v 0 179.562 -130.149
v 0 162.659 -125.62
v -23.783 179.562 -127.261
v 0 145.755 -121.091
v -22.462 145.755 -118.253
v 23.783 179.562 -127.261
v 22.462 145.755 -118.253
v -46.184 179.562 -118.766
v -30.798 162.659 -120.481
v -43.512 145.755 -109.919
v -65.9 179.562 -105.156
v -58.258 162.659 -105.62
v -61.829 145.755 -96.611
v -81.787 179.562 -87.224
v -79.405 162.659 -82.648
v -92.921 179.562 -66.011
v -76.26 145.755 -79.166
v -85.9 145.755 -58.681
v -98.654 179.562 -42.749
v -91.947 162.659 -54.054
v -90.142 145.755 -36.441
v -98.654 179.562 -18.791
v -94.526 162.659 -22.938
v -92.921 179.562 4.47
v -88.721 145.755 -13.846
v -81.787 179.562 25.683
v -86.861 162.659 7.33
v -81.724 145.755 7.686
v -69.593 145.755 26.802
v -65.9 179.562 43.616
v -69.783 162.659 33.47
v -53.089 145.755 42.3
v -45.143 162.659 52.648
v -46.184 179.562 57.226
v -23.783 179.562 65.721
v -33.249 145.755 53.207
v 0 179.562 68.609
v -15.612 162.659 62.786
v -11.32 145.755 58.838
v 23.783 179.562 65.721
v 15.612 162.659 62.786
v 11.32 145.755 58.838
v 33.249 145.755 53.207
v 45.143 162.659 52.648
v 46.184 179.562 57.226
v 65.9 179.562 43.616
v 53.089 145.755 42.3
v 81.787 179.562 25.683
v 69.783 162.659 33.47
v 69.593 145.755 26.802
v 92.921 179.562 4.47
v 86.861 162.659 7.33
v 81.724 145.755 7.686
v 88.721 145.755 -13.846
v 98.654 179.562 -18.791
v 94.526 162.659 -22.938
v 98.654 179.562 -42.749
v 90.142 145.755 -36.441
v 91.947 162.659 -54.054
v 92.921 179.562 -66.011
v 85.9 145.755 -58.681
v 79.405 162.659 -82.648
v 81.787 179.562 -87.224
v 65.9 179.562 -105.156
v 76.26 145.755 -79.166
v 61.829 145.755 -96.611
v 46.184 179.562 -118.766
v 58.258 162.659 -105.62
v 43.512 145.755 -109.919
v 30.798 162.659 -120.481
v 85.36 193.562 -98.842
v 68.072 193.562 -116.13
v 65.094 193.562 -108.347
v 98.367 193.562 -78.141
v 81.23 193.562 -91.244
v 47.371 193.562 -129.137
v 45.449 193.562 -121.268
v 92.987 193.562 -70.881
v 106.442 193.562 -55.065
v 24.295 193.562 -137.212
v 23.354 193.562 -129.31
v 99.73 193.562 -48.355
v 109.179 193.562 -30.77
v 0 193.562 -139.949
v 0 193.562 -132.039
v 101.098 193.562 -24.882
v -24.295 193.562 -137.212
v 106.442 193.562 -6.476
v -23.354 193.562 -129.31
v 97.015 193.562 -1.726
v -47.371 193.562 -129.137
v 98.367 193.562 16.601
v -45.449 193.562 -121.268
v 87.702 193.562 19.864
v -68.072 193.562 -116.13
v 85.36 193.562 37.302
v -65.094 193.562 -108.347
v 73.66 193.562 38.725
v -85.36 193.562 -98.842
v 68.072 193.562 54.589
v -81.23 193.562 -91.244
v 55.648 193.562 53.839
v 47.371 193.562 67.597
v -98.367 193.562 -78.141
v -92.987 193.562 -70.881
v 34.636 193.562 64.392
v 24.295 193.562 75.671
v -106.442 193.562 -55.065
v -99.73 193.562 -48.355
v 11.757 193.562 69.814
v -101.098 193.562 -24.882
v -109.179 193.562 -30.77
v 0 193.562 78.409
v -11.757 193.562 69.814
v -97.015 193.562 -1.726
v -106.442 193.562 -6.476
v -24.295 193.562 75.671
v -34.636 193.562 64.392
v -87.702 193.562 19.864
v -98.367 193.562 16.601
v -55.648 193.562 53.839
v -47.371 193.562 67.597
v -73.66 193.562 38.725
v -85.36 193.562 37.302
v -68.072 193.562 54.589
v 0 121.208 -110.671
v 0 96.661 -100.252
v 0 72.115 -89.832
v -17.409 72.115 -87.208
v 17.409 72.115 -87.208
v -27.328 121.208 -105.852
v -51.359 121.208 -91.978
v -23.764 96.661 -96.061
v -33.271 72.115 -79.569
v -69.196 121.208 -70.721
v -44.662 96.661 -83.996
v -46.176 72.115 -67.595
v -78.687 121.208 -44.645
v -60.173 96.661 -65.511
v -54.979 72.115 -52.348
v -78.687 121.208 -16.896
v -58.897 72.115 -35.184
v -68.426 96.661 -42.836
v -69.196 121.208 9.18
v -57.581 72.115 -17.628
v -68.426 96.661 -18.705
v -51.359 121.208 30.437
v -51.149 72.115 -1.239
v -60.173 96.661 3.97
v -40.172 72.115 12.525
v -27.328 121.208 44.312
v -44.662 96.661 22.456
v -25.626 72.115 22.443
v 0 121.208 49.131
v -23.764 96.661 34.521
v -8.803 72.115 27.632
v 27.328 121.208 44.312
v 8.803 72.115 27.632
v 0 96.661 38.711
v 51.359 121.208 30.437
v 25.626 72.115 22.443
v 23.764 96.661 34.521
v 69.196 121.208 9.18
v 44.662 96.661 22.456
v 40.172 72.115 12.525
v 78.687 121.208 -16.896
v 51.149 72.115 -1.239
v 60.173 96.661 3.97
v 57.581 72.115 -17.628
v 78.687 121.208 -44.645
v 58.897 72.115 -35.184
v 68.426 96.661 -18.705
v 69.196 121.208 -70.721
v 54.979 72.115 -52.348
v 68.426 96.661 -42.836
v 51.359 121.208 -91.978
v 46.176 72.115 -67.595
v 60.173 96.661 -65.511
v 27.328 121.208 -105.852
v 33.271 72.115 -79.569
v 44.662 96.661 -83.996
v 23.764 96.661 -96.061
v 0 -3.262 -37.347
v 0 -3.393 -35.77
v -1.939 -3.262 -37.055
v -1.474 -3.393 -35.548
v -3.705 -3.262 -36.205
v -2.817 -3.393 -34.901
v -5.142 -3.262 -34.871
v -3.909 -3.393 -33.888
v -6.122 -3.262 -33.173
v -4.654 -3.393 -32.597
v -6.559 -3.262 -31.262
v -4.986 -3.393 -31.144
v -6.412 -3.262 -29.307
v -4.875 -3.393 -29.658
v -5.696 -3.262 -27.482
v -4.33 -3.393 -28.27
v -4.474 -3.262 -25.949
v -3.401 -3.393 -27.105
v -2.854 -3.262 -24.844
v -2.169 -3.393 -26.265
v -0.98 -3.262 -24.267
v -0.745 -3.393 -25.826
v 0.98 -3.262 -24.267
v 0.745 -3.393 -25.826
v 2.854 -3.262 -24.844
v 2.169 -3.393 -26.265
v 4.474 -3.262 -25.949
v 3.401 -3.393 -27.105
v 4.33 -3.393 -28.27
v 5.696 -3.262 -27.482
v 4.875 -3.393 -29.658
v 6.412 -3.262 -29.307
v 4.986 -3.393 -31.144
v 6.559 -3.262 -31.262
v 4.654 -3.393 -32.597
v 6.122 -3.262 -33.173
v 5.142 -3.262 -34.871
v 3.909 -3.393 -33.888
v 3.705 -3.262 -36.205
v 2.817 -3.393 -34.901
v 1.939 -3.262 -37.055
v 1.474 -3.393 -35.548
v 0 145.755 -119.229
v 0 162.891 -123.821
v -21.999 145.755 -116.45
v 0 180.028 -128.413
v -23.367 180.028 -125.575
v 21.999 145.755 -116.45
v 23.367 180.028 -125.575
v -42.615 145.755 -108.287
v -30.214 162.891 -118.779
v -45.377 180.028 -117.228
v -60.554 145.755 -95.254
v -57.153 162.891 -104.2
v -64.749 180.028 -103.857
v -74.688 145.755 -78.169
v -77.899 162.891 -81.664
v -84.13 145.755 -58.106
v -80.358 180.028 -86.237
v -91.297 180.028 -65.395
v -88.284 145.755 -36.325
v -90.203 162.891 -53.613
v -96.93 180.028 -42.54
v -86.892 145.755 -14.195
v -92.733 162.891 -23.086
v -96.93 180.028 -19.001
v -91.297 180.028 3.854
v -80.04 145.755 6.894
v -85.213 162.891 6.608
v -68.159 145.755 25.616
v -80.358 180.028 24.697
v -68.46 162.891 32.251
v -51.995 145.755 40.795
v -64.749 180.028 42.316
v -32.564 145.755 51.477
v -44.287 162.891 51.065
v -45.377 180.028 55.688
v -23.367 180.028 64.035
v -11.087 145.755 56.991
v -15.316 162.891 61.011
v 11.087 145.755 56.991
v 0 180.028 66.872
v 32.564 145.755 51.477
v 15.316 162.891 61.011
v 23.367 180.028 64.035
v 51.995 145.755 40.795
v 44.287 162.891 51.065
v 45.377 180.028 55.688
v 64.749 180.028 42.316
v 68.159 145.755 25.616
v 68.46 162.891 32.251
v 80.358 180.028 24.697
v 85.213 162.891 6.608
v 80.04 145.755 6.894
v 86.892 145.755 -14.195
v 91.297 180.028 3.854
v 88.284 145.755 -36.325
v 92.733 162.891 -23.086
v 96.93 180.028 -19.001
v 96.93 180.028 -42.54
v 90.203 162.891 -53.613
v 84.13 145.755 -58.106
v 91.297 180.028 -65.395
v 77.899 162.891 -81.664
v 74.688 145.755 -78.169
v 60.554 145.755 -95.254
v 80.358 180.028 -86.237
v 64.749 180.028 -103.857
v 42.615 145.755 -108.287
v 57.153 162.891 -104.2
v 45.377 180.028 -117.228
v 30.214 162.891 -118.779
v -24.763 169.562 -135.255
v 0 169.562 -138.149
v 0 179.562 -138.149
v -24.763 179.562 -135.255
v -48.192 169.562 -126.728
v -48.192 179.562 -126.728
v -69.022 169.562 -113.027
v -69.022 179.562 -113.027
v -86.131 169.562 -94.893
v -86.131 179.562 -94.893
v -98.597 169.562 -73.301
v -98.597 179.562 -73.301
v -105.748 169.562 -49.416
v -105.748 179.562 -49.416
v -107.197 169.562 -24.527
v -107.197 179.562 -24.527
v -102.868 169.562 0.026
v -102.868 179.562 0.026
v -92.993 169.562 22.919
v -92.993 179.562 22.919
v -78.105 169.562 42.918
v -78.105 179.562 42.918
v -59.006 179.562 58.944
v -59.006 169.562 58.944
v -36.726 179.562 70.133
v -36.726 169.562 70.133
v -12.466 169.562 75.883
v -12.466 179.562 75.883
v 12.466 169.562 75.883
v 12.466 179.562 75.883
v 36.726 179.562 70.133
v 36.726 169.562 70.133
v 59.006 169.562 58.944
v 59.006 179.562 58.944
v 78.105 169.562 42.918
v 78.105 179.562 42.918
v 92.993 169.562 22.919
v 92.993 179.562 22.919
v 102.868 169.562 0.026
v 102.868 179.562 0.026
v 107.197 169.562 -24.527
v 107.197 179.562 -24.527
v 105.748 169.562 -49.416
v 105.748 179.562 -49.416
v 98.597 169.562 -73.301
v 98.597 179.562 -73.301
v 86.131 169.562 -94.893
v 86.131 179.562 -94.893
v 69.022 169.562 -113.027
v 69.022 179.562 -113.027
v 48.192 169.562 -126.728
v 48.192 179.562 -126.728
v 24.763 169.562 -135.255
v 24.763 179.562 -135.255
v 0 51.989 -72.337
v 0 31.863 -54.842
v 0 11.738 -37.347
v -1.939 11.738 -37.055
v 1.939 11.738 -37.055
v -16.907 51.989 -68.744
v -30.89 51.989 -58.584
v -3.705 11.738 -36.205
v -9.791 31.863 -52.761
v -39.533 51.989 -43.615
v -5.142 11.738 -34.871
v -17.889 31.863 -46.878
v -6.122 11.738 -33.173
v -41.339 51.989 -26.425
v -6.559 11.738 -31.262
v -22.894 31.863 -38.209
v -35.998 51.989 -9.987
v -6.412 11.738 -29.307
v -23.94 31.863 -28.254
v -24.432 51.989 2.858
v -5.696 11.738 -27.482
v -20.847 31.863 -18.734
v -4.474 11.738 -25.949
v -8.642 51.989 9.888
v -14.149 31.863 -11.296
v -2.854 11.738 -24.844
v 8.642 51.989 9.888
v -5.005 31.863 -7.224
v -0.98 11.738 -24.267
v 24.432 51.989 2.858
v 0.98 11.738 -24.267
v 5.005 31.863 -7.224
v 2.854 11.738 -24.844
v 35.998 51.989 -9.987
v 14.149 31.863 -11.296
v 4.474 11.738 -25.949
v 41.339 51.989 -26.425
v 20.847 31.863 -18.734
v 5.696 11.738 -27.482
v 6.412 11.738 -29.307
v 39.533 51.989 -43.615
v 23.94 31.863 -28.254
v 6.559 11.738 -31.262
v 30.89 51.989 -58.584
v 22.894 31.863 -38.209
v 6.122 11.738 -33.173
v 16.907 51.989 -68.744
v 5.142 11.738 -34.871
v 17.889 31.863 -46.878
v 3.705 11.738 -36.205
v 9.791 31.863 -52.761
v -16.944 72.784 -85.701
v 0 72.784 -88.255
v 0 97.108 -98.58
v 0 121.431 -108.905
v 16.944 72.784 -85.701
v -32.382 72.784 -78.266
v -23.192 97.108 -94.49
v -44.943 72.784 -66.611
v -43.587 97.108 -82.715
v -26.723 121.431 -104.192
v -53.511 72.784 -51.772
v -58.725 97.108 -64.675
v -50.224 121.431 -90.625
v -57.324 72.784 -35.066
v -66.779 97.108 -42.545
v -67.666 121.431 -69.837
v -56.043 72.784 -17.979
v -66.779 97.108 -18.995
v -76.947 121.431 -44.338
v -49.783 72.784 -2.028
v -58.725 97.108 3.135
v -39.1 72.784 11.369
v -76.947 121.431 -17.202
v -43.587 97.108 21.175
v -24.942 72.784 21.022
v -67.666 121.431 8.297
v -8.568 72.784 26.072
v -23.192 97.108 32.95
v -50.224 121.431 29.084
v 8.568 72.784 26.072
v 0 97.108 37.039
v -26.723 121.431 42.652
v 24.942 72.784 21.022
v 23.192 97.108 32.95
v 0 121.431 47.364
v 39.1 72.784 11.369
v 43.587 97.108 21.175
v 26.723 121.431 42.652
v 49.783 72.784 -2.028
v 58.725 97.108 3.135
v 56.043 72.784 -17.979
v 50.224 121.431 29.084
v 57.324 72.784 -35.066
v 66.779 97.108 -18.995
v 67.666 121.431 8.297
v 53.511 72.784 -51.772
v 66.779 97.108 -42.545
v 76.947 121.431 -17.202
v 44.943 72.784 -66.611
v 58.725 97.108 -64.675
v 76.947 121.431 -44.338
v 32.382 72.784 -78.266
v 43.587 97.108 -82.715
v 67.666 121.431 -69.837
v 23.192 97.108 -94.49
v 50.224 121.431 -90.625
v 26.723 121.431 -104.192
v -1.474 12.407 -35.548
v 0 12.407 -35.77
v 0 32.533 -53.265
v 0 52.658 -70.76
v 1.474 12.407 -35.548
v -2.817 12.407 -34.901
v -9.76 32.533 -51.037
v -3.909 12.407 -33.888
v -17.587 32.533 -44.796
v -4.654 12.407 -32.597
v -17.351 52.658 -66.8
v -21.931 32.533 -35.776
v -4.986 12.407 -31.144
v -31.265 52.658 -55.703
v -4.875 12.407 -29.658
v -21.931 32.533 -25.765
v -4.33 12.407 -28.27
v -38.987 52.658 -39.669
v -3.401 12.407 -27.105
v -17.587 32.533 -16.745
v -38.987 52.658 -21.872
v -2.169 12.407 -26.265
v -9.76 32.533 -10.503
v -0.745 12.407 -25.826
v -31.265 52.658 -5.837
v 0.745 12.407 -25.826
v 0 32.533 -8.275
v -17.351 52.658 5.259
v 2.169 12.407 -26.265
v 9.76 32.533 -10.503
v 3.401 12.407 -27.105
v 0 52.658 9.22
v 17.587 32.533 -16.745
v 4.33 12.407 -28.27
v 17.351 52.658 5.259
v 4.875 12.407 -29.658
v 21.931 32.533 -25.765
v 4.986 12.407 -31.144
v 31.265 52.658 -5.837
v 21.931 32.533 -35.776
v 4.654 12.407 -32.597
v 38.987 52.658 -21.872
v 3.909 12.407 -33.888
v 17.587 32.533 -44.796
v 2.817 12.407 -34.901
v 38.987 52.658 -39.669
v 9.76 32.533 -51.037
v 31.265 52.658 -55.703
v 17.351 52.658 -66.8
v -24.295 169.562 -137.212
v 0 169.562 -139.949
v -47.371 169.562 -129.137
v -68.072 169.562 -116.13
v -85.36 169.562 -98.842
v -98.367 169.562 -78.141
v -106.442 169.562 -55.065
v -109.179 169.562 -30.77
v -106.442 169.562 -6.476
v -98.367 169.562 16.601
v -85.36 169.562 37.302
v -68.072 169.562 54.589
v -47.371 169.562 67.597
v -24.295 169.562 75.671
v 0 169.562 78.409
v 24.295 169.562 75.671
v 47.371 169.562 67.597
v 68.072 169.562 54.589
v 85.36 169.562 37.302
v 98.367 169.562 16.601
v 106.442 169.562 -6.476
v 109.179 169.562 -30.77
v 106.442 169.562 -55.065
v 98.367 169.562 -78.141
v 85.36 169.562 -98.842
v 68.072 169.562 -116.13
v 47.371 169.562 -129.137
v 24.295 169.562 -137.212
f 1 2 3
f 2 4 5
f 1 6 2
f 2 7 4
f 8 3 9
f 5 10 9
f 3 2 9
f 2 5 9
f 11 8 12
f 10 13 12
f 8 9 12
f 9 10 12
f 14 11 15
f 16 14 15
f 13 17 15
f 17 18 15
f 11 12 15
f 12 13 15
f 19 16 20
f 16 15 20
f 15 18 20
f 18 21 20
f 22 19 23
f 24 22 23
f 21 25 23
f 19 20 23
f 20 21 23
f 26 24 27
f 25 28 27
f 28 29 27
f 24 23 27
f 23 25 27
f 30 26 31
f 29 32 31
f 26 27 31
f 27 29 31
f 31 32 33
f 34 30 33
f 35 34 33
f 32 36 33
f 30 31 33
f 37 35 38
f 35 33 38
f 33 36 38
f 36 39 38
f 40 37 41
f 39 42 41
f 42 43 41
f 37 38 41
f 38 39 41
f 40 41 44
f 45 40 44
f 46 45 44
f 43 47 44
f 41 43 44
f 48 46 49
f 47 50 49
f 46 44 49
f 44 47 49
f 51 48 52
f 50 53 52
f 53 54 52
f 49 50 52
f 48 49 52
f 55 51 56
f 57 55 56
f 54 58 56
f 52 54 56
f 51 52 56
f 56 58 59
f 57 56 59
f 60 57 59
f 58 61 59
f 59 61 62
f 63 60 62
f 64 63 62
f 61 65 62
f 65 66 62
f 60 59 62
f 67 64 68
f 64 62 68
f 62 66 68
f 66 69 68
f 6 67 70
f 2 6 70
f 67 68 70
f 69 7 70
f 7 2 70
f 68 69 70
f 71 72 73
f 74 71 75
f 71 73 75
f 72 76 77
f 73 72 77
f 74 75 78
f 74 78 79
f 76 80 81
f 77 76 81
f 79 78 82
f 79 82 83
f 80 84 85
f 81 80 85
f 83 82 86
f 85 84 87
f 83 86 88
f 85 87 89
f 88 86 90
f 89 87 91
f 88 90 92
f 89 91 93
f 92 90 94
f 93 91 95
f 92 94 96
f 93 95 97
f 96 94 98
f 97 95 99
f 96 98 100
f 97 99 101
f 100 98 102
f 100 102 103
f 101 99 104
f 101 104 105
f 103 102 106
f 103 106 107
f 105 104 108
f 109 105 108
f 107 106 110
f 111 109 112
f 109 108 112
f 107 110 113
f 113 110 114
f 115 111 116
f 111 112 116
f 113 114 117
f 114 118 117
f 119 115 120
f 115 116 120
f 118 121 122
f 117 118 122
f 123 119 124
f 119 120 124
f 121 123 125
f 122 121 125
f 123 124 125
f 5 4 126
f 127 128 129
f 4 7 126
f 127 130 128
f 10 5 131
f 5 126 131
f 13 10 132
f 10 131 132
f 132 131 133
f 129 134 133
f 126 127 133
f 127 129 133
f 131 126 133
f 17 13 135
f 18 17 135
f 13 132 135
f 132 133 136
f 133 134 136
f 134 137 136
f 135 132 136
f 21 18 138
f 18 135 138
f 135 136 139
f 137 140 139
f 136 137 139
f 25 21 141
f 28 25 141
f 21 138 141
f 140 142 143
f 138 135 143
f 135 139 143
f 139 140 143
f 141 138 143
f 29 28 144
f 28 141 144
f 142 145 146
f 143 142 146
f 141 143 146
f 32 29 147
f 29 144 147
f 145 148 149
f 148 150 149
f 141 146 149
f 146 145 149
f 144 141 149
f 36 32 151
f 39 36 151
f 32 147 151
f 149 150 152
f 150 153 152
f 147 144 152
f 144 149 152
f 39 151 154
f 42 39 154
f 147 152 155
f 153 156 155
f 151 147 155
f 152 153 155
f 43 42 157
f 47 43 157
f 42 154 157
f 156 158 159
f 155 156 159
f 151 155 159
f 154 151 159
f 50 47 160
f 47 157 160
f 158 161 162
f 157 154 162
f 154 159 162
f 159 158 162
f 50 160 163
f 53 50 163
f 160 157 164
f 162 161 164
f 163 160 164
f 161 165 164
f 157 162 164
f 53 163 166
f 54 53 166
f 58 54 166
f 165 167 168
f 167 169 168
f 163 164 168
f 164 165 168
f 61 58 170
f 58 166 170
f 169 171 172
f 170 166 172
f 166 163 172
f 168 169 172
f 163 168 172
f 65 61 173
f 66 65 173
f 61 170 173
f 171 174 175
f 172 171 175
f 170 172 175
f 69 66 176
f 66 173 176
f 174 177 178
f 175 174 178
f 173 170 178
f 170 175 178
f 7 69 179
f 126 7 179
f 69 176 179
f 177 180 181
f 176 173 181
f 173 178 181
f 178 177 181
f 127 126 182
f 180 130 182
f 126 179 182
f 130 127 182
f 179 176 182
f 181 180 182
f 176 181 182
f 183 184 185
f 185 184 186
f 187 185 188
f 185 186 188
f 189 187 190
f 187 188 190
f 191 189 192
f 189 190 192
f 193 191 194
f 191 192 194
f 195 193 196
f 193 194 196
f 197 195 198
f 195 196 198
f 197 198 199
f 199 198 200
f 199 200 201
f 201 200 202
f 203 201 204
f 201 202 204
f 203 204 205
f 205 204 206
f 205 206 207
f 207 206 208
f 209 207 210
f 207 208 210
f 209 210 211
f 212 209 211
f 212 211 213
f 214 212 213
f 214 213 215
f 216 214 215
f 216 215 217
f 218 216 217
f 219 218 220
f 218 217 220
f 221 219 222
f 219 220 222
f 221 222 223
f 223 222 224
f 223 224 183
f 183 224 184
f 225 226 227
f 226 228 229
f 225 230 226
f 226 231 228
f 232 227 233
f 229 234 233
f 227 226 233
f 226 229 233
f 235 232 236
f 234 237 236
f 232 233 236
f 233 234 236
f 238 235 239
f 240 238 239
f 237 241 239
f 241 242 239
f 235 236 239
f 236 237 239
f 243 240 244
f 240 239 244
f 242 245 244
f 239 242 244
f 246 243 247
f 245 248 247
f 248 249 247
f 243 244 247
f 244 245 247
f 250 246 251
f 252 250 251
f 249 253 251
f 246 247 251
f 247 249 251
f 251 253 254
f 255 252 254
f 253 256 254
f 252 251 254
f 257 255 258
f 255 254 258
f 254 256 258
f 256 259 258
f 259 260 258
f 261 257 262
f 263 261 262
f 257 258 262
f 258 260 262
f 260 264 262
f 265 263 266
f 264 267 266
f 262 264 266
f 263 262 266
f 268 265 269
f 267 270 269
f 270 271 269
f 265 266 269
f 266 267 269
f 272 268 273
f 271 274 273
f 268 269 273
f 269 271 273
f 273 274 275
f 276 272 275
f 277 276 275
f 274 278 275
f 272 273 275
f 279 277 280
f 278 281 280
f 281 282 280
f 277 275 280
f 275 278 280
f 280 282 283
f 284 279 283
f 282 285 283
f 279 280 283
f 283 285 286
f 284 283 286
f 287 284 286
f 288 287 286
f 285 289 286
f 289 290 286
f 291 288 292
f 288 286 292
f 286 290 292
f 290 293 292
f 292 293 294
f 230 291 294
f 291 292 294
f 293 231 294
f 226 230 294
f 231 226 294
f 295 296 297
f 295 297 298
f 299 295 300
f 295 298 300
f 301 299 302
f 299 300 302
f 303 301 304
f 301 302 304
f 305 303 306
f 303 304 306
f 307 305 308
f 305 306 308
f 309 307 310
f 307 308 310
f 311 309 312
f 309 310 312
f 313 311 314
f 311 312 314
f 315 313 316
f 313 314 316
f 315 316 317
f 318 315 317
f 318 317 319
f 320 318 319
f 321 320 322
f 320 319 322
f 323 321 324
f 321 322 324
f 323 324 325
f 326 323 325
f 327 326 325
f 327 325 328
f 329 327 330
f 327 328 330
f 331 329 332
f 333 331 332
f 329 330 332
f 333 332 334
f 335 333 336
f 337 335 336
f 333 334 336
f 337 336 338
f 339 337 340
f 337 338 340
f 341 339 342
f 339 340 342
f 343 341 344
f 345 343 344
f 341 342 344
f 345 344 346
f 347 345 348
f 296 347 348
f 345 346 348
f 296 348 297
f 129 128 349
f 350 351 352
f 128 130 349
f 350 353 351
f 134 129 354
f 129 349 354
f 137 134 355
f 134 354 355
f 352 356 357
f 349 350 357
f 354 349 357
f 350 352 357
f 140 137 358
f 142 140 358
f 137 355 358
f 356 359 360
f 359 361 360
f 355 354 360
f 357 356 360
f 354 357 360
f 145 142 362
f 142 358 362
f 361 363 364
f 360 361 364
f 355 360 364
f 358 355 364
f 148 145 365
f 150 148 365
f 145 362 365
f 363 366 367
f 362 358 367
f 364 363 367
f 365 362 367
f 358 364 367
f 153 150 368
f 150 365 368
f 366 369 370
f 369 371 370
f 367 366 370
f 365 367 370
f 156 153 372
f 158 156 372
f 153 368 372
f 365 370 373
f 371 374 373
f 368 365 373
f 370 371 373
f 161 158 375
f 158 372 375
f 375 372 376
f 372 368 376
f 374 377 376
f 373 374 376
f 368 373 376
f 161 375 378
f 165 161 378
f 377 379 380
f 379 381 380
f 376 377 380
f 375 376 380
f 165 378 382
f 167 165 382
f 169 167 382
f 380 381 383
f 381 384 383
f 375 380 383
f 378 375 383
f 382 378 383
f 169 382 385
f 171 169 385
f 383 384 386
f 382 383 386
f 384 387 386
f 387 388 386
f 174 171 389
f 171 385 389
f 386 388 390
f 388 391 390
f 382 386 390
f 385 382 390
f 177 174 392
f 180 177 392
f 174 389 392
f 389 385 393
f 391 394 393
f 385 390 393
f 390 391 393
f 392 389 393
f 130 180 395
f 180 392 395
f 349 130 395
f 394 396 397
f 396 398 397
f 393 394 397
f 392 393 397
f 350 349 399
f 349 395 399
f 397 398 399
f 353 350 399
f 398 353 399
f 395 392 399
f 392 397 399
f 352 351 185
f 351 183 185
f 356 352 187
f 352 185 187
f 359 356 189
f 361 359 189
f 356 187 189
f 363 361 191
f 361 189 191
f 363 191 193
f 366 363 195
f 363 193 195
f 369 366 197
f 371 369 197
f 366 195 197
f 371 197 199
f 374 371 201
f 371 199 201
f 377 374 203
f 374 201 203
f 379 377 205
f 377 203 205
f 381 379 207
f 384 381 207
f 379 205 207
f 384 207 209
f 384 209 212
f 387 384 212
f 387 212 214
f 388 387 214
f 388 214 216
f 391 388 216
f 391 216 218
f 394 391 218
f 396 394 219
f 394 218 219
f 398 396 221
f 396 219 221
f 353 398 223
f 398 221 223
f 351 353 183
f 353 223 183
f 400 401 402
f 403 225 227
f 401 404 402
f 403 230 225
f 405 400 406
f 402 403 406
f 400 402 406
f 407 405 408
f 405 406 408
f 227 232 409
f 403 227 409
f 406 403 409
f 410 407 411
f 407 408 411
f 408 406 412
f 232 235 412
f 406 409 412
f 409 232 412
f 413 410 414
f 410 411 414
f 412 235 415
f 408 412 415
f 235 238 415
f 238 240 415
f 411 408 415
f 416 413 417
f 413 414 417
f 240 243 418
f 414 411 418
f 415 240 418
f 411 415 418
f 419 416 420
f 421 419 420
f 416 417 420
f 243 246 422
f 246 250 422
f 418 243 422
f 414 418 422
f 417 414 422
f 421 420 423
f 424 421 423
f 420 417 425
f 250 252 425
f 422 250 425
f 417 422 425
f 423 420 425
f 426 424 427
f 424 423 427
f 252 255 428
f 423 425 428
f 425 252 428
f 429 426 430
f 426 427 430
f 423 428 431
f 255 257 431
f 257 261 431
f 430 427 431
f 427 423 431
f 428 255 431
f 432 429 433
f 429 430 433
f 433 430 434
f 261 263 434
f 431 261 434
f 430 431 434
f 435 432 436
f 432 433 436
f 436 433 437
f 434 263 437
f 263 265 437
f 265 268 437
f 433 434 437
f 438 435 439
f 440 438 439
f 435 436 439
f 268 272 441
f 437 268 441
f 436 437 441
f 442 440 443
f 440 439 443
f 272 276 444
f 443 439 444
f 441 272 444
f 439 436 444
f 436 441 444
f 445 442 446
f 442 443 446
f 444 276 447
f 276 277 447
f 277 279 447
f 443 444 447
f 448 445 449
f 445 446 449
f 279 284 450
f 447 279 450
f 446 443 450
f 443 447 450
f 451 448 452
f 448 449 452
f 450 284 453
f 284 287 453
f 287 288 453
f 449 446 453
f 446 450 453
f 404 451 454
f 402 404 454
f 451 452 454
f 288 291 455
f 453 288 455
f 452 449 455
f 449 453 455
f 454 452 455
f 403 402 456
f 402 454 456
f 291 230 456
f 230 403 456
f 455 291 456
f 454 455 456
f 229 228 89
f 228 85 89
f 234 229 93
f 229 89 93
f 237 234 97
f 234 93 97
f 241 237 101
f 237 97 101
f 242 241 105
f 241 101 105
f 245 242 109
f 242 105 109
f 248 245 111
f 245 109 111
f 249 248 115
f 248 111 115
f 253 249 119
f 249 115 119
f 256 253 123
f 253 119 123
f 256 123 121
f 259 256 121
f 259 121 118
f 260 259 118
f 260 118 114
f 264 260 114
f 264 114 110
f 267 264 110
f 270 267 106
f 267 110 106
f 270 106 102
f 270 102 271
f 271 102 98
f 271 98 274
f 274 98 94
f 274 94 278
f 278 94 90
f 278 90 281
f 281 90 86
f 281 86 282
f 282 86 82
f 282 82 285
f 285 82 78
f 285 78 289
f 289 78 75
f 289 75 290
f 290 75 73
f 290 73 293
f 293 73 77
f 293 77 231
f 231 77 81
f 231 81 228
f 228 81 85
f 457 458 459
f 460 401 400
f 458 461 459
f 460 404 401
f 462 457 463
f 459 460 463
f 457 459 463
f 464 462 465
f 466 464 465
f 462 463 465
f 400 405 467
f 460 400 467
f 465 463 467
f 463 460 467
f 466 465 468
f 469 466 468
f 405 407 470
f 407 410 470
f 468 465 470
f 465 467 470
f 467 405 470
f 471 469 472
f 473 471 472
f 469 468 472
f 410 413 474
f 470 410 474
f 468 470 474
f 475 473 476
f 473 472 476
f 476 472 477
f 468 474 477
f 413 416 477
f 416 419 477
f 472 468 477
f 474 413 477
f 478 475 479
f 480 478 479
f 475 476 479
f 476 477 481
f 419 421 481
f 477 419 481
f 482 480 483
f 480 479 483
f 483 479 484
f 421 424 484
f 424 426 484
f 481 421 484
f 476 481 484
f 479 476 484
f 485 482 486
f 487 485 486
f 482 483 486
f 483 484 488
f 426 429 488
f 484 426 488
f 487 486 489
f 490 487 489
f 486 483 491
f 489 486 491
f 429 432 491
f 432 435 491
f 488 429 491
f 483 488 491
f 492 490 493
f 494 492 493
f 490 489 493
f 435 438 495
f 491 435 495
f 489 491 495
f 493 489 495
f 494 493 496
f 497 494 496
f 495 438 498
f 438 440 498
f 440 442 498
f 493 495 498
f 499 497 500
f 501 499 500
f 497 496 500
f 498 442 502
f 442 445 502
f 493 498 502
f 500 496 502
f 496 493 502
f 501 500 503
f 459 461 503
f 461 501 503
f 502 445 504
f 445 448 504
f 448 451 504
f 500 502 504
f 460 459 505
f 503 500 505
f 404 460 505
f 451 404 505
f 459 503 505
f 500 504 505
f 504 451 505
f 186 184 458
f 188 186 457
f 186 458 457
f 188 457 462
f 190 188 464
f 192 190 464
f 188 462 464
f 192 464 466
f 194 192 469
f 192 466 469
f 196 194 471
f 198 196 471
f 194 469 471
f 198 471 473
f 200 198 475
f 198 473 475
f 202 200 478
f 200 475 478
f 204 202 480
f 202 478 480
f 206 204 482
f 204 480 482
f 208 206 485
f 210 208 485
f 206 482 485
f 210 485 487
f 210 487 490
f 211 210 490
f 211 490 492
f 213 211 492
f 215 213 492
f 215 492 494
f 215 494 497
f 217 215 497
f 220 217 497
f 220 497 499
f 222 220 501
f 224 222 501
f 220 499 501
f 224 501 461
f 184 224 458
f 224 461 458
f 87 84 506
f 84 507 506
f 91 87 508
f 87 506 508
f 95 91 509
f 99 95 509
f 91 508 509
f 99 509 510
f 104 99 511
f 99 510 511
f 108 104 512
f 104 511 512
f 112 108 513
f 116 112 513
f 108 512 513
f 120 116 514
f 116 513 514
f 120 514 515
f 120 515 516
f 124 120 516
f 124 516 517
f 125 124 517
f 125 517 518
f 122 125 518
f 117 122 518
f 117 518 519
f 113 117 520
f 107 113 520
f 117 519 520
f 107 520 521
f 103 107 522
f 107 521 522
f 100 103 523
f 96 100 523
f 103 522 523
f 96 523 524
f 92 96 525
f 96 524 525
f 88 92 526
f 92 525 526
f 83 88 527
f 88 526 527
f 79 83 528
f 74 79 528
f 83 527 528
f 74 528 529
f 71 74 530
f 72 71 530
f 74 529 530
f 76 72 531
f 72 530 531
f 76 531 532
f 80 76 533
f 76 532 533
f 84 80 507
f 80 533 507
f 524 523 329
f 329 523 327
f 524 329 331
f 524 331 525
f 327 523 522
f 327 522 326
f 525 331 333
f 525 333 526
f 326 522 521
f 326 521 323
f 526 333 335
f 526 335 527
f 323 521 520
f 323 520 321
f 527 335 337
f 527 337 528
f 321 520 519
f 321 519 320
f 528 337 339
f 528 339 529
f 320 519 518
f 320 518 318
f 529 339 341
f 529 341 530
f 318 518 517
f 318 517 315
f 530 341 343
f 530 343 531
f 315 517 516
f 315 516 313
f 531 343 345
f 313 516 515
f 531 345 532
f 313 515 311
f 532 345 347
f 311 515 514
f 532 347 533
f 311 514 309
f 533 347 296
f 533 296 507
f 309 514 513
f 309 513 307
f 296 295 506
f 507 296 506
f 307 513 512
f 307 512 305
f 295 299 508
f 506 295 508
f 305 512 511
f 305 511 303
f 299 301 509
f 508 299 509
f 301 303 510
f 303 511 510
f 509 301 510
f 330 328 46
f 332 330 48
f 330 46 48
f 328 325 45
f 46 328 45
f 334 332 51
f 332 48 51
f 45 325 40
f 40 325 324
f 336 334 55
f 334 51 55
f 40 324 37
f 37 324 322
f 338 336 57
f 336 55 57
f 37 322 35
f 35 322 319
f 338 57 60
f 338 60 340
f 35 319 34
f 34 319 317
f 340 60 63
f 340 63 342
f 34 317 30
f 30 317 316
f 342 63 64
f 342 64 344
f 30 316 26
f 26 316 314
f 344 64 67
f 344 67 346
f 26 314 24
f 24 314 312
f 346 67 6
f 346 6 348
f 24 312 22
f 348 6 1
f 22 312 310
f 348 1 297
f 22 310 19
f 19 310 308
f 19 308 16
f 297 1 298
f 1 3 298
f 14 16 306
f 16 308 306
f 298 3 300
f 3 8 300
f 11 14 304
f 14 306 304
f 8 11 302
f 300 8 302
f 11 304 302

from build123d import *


with BuildPart() as part:
    # Schizzo1 → Rivoluzione1 (revolve)
    with BuildSketch(Plane(origin=(0, 0, 0), x_dir=(0, 0, -1), z_dir=(1, 0, 0)), mode=Mode.PRIVATE) as rivoluzione1_sk:
        Polygon((24.193102917, 11.737734445), (24.193102917, -3.262265555), (25.77022715, -3.392816036), (25.77022715, 12.407183964), (-26.71449517, 72.783950382), (-28.291619402, 72.114500863), align=None)
        Polygon((-59.550109681, 145.754889139), (-28.291619402, 72.114500863), (-26.71449517, 72.783950382), (-57.688820987, 145.754889139), (-66.872170267, 180.027615233), (-70.49877626, 193.562293059), (-78.40877626, 193.562293059), (-78.40877626, 169.562293059), (-76.60877626, 169.562293059), (-76.60877626, 179.562293059), (-68.60877626, 179.562293059), align=None)
    revolve(rivoluzione1_sk.sketch.rotate(Axis((0, -3.392816036, -30.77022715), (0, 1, 0)), 180), axis=Axis((0, -3.392816036, -30.77022715), (0, 1, 0)))


solid = part.part
